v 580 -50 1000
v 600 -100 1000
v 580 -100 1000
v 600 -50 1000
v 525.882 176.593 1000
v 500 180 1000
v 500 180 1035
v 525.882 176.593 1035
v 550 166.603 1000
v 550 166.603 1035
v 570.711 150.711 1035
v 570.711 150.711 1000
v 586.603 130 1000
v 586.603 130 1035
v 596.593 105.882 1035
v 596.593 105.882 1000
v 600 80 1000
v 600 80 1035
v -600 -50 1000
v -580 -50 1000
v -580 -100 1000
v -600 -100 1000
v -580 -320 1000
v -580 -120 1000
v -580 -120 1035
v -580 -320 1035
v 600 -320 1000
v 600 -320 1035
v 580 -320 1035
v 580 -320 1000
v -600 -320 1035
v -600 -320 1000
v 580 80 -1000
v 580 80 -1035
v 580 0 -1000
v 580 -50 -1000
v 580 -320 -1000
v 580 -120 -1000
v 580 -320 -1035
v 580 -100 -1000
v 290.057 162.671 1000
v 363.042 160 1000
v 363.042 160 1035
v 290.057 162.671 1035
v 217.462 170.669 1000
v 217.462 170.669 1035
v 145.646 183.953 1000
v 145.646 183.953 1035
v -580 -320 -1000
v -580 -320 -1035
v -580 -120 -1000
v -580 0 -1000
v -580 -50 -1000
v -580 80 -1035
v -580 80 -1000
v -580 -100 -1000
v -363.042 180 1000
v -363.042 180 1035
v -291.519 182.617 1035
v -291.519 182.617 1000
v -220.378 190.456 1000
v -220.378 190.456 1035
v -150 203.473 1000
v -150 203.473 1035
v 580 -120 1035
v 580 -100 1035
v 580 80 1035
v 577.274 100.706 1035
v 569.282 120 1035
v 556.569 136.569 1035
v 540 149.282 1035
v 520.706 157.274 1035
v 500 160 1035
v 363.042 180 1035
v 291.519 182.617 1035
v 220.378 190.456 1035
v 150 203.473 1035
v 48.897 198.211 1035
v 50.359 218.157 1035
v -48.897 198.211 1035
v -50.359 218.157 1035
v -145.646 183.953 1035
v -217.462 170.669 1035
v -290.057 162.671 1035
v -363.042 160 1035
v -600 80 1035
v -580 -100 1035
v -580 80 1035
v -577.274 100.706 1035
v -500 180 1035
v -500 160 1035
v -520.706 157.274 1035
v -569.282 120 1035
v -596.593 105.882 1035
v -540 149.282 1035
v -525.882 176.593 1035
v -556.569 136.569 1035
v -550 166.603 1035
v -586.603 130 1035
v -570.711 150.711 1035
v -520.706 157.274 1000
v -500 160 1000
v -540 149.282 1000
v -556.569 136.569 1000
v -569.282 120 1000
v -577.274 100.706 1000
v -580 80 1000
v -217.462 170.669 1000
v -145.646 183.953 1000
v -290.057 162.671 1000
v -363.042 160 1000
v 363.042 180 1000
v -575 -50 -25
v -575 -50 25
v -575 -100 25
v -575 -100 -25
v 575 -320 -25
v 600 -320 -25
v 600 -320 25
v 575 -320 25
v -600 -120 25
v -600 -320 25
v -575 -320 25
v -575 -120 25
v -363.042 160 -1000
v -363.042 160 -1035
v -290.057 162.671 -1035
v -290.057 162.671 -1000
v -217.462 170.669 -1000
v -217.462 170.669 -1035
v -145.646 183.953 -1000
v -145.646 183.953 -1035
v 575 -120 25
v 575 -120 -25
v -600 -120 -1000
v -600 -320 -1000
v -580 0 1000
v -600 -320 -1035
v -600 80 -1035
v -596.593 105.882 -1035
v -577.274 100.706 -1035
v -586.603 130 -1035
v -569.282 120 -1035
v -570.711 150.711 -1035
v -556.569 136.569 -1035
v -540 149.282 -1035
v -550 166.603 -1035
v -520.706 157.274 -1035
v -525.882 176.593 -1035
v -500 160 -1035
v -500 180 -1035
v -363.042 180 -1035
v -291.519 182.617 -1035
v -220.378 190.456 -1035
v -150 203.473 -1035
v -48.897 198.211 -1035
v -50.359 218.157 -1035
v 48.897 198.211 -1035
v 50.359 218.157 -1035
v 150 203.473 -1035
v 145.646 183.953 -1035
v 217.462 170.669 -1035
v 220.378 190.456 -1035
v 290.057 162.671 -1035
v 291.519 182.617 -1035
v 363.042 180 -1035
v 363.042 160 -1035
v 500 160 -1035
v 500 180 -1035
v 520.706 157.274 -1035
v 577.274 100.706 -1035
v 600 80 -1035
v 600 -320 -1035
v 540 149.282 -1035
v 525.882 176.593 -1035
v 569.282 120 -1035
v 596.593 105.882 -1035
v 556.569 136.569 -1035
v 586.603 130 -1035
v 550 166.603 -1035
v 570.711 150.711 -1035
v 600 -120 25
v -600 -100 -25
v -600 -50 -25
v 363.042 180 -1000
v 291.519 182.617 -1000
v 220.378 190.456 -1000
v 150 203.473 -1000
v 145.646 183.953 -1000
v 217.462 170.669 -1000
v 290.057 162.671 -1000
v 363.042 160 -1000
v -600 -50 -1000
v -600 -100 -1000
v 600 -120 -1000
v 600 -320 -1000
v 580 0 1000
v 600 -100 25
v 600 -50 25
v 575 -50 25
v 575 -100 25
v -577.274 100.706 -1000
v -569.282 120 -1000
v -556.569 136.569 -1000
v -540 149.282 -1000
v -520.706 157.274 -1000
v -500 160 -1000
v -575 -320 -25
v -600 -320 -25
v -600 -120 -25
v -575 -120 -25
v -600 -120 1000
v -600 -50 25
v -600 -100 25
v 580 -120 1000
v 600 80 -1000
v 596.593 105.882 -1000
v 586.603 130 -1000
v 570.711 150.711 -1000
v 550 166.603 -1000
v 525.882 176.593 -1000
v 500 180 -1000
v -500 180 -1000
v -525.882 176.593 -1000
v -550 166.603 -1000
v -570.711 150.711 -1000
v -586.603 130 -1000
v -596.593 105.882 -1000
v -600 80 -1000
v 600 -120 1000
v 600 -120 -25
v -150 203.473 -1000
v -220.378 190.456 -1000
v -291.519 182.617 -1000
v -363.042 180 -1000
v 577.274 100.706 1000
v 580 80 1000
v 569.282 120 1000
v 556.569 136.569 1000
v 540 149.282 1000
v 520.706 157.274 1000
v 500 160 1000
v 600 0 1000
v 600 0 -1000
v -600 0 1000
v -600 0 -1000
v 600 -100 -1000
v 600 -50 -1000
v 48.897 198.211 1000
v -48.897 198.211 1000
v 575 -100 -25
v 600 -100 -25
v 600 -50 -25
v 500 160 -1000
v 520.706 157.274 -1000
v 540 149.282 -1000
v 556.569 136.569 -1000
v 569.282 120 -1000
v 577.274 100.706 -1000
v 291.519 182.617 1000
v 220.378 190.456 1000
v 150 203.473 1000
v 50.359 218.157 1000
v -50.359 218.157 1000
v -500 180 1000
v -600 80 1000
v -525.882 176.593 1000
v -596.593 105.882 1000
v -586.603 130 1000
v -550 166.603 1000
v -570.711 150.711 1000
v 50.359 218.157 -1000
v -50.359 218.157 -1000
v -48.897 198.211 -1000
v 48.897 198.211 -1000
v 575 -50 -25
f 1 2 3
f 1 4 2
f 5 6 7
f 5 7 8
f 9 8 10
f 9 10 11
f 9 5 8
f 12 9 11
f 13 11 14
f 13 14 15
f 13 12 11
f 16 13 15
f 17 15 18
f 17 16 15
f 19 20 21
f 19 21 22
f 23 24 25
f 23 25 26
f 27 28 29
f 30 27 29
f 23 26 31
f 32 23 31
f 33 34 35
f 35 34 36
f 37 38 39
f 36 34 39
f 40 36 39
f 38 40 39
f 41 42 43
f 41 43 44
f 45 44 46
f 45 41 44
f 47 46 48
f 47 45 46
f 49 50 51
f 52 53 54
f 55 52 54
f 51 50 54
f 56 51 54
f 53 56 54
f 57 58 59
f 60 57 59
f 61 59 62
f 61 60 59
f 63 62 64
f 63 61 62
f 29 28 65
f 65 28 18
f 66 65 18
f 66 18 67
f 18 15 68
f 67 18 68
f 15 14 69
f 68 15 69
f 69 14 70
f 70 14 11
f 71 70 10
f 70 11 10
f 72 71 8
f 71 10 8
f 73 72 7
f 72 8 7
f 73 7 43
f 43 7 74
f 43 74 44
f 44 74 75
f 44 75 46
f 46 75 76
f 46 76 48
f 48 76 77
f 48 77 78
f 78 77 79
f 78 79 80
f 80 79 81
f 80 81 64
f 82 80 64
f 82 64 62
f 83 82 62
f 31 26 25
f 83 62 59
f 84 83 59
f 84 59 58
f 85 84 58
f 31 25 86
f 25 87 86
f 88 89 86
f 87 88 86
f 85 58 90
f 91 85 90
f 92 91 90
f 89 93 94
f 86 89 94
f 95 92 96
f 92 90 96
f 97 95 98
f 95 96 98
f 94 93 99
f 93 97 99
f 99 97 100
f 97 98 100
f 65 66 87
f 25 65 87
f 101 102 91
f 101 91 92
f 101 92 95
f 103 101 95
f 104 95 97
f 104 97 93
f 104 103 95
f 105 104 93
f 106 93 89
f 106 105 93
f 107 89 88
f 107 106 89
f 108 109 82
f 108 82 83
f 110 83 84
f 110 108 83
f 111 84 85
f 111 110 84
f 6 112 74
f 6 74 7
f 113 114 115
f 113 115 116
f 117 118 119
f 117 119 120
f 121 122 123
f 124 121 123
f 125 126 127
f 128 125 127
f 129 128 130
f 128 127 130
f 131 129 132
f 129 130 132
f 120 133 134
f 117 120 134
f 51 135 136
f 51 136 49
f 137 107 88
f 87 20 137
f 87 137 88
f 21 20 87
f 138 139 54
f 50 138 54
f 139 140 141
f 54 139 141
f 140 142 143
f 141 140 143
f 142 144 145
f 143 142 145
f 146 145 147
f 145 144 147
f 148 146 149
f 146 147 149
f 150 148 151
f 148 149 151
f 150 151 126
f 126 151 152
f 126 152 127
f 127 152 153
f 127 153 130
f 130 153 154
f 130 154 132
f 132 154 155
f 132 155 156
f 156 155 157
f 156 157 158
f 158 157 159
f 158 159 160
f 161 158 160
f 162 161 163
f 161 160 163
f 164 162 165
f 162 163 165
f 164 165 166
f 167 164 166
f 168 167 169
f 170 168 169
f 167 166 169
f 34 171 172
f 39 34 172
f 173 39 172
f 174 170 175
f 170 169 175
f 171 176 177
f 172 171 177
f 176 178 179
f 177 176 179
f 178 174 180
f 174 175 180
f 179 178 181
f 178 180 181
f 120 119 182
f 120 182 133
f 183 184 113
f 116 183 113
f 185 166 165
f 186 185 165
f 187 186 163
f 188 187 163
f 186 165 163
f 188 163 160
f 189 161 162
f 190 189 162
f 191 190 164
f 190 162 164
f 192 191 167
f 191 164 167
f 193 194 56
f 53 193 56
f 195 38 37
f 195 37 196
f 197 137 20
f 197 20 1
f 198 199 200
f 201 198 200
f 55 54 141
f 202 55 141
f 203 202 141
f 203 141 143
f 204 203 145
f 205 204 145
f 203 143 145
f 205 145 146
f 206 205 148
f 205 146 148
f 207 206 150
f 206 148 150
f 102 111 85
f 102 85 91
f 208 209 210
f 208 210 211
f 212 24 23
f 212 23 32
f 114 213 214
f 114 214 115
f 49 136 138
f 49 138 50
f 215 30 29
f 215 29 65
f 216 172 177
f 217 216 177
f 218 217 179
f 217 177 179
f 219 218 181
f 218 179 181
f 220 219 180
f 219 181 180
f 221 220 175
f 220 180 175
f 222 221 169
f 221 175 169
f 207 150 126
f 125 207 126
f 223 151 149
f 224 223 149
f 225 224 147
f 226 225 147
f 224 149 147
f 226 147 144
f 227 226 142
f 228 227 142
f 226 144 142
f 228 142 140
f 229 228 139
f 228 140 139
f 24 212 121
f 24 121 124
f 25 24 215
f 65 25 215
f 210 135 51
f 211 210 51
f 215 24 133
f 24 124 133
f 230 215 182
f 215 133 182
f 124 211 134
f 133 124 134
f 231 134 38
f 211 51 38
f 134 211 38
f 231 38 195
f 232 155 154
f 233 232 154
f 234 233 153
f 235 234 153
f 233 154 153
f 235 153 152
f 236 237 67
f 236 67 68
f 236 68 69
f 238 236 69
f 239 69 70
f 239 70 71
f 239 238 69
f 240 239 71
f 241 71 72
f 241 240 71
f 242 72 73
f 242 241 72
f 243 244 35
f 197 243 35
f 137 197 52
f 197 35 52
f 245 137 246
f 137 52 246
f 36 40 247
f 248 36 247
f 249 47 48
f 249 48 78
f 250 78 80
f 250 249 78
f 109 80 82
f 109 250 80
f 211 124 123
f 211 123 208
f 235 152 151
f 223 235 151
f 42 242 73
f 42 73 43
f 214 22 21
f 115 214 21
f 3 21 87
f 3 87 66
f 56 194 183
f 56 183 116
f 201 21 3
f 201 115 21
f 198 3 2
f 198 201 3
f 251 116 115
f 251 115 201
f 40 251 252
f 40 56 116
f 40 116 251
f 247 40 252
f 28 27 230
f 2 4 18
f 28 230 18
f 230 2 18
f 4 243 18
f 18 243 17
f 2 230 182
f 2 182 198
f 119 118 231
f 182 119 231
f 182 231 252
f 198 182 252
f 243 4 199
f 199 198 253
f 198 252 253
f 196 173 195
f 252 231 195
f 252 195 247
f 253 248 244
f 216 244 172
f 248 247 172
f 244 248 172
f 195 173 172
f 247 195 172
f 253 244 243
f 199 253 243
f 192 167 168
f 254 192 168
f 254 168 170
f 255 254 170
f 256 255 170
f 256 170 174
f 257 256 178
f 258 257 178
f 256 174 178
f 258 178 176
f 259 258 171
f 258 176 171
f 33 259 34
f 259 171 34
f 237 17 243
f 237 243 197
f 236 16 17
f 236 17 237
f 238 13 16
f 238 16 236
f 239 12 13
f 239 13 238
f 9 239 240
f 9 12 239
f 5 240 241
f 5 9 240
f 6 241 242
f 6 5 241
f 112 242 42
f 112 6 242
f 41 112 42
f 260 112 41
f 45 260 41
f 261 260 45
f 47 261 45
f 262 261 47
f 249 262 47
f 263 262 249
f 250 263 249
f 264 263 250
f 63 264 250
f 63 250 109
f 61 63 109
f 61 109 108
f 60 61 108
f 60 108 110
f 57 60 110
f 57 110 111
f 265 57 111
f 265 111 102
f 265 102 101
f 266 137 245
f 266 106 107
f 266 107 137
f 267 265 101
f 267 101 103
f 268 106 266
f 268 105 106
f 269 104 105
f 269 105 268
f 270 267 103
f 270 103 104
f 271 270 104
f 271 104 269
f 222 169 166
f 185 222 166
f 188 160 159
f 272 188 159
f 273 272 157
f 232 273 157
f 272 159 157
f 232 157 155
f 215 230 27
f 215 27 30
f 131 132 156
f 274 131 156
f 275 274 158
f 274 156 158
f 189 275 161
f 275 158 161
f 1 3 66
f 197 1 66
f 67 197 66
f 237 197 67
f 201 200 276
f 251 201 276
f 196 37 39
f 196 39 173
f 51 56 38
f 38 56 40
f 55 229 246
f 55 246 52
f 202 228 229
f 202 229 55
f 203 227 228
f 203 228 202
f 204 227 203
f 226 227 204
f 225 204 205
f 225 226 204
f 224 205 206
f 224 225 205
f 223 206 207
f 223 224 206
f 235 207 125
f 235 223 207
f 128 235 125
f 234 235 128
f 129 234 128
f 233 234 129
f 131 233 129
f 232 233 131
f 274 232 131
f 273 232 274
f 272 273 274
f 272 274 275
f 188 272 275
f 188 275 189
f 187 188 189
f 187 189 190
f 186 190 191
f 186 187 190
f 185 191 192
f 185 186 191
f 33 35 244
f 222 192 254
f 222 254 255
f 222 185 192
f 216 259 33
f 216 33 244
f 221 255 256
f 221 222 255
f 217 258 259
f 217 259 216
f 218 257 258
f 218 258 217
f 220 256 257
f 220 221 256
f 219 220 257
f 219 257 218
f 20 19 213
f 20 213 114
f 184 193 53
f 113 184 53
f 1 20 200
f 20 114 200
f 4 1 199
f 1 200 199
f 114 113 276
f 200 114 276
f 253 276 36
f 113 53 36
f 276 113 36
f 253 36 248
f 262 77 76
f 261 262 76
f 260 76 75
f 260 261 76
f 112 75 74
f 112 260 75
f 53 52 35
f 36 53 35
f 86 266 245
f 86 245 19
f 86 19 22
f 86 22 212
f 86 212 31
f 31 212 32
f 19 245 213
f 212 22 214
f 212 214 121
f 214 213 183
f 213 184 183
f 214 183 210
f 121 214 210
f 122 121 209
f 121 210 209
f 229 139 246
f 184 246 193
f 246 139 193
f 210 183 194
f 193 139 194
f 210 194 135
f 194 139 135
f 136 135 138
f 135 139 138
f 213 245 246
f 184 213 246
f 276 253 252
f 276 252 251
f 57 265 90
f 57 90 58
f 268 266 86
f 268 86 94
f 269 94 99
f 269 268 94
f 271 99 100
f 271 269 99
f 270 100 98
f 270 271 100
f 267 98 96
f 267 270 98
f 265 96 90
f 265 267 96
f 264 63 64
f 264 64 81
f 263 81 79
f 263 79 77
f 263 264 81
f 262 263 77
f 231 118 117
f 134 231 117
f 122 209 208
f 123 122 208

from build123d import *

# Parameters (mm, degrees)
SKETCH_1_W         = 1200
SKETCH_1_H         = 2000
EXTRUDE_1_DEPTH    = 50
SKETCH_2_W         = 25
SKETCH_2_H         = 50
EXTRUDE_2_DEPTH    = 320
EXTRUDE_1_2_DEPTH  = 35
SKETCH_4_W         = 1200
SKETCH_4_H         = 20
EXTRUDE_3_DEPTH    = 35
MIRROR_START       = -1000
MIRROR_2_OUTLINE_W = 1200
MIRROR_2_OUTLINE_H = 20
MIRROR_2_DEPTH     = 2000
MIRROR_START_2     = -1035
MIRROR_2_2_DEPTH   = 35


# Read off the part's stored shape, not the designer's step: 镜向2
with BuildPart() as part:
    # 草图1 → Extrude 1 (new body)
    with BuildSketch(Plane(origin=(0, 0, 0), x_dir=(1, 0, 0), z_dir=(0, 1, 0))):
        Rectangle(SKETCH_1_W, SKETCH_1_H)
    extrude(amount=-EXTRUDE_1_DEPTH)

    # 草图2 → 凸台-拉伸2 (add)
    with BuildSketch(Plane(origin=(0, 0, 0), x_dir=(1, 0, 0), z_dir=(0, 1, 0))):
        with Locations((-587.5, 0)):
            Rectangle(SKETCH_2_W, SKETCH_2_H)
    extrude_2 = extrude(amount=-EXTRUDE_2_DEPTH)

    # 镜向1: 凸台-拉伸2 across plane
    add(extrude_2.mirror(Plane(origin=(0, 0, 0), x_dir=(0, 0, 1), z_dir=(1, 0, 0))))

    # 草图3 → Extrude 1 2 (add)
    with BuildSketch(Plane.XY.offset(1000)):
        with BuildLine():
            Line((-600, -320), (-600, 80))
            ThreePointArc((-600, 80), (-570.710678119, 150.710678119), (-500, 180))
            Line((-500, 180), (-363.0422981, 180))
            ThreePointArc((-363.0422981, 180), (-255.876535707, 185.885952353), (-150, 203.473000167))
            ThreePointArc((-150, 203.473000167), (0, 220), (150, 203.473000167))
            ThreePointArc((150, 203.473000167), (255.876535707, 185.885952353), (363.0422981, 180))
            Line((363.0422981, 180), (500, 180))
            ThreePointArc((500, 180), (570.710678119, 150.710678119), (600, 80))
            Line((600, 80), (600, -320))
            Line((600, -320), (580, -320))
            Line((580, -320), (580, 80))
            ThreePointArc((580, 80), (556.568542495, 136.568542495), (500, 160))
            Line((500, 160), (363.0422981, 160))
            ThreePointArc((363.0422981, 160), (253.686190615, 166.006254459), (145.645660129, 183.952761329))
            ThreePointArc((145.645660129, 183.952761329), (0, 200), (-145.645660129, 183.952761329))
            ThreePointArc((-145.645660129, 183.952761329), (-253.686190615, 166.006254459), (-363.0422981, 160))
            Line((-363.0422981, 160), (-500, 160))
            ThreePointArc((-500, 160), (-556.568542495, 136.568542495), (-580, 80))
            Line((-580, 80), (-580, -320))
            Line((-580, -320), (-600, -320))
        make_face()
    extrude(amount=EXTRUDE_1_2_DEPTH)

    # 草图4 → 拉伸-薄壁3 (add)
    with BuildSketch(Plane.XY.offset(1000)):
        with Locations((0, -110)):
            Rectangle(SKETCH_4_W, SKETCH_4_H)
    extrude(amount=EXTRUDE_3_DEPTH)

    # 镜向2 outline → 镜向2 (add)
    with BuildSketch(Plane.XY.offset(MIRROR_START)):
        with Locations((0, -110)):
            Rectangle(MIRROR_2_OUTLINE_W, MIRROR_2_OUTLINE_H)
    extrude(amount=MIRROR_2_DEPTH)

    # Mirror 2 2 outline → Mirror 2 2 (add)
    with BuildSketch(Plane.XY.offset(MIRROR_START_2)):
        with BuildLine():
            ThreePointArc((-580, 80), (-556.568542495, 136.568542495), (-500, 160))
            Line((-500, 160), (-363.0422981, 160))
            ThreePointArc((-363.0422981, 160), (-253.686190616, 166.006254459), (-145.645660129, 183.952761329))
            ThreePointArc((-145.645660129, 183.952761329), (0, 200), (145.645660129, 183.952761329))
            ThreePointArc((145.645660129, 183.952761329), (253.686190616, 166.006254459), (363.0422981, 160))
            Line((363.0422981, 160), (500, 160))
            ThreePointArc((500, 160), (556.568542495, 136.568542495), (580, 80))
            Line((580, 80), (580, -320))
            Line((580, -320), (600, -320))
            Line((600, -320), (600, 80))
            ThreePointArc((600, 80), (570.710678119, 150.710678119), (500, 180))
            Line((500, 180), (363.0422981, 180))
            ThreePointArc((363.0422981, 180), (255.876535708, 185.885952353), (150, 203.473000167))
            ThreePointArc((150, 203.473000167), (0, 220), (-150, 203.473000167))
            ThreePointArc((-150, 203.473000167), (-255.876535708, 185.885952353), (-363.0422981, 180))
            Line((-363.0422981, 180), (-500, 180))
            ThreePointArc((-500, 180), (-570.710678119, 150.710678119), (-600, 80))
            Line((-600, 80), (-600, -320))
            Line((-600, -320), (-580, -320))
            Line((-580, -320), (-580, 80))
        make_face()
    extrude(amount=MIRROR_2_2_DEPTH)


solid = part.part
